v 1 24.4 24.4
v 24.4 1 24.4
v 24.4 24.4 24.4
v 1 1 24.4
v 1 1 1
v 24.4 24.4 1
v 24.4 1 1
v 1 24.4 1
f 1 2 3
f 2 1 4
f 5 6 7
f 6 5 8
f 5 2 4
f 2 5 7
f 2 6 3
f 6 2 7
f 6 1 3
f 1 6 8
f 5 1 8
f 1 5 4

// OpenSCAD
$fn = 150;

difference() {
	%cube(size = [25.4, 25.4, 25.4]);
	translate(v = [1, 1, 1]) {
		color(alpha = 1.0, c = "green") {
			cube(size = [23.4, 23.4, 23.4]);
		}
	}
}
